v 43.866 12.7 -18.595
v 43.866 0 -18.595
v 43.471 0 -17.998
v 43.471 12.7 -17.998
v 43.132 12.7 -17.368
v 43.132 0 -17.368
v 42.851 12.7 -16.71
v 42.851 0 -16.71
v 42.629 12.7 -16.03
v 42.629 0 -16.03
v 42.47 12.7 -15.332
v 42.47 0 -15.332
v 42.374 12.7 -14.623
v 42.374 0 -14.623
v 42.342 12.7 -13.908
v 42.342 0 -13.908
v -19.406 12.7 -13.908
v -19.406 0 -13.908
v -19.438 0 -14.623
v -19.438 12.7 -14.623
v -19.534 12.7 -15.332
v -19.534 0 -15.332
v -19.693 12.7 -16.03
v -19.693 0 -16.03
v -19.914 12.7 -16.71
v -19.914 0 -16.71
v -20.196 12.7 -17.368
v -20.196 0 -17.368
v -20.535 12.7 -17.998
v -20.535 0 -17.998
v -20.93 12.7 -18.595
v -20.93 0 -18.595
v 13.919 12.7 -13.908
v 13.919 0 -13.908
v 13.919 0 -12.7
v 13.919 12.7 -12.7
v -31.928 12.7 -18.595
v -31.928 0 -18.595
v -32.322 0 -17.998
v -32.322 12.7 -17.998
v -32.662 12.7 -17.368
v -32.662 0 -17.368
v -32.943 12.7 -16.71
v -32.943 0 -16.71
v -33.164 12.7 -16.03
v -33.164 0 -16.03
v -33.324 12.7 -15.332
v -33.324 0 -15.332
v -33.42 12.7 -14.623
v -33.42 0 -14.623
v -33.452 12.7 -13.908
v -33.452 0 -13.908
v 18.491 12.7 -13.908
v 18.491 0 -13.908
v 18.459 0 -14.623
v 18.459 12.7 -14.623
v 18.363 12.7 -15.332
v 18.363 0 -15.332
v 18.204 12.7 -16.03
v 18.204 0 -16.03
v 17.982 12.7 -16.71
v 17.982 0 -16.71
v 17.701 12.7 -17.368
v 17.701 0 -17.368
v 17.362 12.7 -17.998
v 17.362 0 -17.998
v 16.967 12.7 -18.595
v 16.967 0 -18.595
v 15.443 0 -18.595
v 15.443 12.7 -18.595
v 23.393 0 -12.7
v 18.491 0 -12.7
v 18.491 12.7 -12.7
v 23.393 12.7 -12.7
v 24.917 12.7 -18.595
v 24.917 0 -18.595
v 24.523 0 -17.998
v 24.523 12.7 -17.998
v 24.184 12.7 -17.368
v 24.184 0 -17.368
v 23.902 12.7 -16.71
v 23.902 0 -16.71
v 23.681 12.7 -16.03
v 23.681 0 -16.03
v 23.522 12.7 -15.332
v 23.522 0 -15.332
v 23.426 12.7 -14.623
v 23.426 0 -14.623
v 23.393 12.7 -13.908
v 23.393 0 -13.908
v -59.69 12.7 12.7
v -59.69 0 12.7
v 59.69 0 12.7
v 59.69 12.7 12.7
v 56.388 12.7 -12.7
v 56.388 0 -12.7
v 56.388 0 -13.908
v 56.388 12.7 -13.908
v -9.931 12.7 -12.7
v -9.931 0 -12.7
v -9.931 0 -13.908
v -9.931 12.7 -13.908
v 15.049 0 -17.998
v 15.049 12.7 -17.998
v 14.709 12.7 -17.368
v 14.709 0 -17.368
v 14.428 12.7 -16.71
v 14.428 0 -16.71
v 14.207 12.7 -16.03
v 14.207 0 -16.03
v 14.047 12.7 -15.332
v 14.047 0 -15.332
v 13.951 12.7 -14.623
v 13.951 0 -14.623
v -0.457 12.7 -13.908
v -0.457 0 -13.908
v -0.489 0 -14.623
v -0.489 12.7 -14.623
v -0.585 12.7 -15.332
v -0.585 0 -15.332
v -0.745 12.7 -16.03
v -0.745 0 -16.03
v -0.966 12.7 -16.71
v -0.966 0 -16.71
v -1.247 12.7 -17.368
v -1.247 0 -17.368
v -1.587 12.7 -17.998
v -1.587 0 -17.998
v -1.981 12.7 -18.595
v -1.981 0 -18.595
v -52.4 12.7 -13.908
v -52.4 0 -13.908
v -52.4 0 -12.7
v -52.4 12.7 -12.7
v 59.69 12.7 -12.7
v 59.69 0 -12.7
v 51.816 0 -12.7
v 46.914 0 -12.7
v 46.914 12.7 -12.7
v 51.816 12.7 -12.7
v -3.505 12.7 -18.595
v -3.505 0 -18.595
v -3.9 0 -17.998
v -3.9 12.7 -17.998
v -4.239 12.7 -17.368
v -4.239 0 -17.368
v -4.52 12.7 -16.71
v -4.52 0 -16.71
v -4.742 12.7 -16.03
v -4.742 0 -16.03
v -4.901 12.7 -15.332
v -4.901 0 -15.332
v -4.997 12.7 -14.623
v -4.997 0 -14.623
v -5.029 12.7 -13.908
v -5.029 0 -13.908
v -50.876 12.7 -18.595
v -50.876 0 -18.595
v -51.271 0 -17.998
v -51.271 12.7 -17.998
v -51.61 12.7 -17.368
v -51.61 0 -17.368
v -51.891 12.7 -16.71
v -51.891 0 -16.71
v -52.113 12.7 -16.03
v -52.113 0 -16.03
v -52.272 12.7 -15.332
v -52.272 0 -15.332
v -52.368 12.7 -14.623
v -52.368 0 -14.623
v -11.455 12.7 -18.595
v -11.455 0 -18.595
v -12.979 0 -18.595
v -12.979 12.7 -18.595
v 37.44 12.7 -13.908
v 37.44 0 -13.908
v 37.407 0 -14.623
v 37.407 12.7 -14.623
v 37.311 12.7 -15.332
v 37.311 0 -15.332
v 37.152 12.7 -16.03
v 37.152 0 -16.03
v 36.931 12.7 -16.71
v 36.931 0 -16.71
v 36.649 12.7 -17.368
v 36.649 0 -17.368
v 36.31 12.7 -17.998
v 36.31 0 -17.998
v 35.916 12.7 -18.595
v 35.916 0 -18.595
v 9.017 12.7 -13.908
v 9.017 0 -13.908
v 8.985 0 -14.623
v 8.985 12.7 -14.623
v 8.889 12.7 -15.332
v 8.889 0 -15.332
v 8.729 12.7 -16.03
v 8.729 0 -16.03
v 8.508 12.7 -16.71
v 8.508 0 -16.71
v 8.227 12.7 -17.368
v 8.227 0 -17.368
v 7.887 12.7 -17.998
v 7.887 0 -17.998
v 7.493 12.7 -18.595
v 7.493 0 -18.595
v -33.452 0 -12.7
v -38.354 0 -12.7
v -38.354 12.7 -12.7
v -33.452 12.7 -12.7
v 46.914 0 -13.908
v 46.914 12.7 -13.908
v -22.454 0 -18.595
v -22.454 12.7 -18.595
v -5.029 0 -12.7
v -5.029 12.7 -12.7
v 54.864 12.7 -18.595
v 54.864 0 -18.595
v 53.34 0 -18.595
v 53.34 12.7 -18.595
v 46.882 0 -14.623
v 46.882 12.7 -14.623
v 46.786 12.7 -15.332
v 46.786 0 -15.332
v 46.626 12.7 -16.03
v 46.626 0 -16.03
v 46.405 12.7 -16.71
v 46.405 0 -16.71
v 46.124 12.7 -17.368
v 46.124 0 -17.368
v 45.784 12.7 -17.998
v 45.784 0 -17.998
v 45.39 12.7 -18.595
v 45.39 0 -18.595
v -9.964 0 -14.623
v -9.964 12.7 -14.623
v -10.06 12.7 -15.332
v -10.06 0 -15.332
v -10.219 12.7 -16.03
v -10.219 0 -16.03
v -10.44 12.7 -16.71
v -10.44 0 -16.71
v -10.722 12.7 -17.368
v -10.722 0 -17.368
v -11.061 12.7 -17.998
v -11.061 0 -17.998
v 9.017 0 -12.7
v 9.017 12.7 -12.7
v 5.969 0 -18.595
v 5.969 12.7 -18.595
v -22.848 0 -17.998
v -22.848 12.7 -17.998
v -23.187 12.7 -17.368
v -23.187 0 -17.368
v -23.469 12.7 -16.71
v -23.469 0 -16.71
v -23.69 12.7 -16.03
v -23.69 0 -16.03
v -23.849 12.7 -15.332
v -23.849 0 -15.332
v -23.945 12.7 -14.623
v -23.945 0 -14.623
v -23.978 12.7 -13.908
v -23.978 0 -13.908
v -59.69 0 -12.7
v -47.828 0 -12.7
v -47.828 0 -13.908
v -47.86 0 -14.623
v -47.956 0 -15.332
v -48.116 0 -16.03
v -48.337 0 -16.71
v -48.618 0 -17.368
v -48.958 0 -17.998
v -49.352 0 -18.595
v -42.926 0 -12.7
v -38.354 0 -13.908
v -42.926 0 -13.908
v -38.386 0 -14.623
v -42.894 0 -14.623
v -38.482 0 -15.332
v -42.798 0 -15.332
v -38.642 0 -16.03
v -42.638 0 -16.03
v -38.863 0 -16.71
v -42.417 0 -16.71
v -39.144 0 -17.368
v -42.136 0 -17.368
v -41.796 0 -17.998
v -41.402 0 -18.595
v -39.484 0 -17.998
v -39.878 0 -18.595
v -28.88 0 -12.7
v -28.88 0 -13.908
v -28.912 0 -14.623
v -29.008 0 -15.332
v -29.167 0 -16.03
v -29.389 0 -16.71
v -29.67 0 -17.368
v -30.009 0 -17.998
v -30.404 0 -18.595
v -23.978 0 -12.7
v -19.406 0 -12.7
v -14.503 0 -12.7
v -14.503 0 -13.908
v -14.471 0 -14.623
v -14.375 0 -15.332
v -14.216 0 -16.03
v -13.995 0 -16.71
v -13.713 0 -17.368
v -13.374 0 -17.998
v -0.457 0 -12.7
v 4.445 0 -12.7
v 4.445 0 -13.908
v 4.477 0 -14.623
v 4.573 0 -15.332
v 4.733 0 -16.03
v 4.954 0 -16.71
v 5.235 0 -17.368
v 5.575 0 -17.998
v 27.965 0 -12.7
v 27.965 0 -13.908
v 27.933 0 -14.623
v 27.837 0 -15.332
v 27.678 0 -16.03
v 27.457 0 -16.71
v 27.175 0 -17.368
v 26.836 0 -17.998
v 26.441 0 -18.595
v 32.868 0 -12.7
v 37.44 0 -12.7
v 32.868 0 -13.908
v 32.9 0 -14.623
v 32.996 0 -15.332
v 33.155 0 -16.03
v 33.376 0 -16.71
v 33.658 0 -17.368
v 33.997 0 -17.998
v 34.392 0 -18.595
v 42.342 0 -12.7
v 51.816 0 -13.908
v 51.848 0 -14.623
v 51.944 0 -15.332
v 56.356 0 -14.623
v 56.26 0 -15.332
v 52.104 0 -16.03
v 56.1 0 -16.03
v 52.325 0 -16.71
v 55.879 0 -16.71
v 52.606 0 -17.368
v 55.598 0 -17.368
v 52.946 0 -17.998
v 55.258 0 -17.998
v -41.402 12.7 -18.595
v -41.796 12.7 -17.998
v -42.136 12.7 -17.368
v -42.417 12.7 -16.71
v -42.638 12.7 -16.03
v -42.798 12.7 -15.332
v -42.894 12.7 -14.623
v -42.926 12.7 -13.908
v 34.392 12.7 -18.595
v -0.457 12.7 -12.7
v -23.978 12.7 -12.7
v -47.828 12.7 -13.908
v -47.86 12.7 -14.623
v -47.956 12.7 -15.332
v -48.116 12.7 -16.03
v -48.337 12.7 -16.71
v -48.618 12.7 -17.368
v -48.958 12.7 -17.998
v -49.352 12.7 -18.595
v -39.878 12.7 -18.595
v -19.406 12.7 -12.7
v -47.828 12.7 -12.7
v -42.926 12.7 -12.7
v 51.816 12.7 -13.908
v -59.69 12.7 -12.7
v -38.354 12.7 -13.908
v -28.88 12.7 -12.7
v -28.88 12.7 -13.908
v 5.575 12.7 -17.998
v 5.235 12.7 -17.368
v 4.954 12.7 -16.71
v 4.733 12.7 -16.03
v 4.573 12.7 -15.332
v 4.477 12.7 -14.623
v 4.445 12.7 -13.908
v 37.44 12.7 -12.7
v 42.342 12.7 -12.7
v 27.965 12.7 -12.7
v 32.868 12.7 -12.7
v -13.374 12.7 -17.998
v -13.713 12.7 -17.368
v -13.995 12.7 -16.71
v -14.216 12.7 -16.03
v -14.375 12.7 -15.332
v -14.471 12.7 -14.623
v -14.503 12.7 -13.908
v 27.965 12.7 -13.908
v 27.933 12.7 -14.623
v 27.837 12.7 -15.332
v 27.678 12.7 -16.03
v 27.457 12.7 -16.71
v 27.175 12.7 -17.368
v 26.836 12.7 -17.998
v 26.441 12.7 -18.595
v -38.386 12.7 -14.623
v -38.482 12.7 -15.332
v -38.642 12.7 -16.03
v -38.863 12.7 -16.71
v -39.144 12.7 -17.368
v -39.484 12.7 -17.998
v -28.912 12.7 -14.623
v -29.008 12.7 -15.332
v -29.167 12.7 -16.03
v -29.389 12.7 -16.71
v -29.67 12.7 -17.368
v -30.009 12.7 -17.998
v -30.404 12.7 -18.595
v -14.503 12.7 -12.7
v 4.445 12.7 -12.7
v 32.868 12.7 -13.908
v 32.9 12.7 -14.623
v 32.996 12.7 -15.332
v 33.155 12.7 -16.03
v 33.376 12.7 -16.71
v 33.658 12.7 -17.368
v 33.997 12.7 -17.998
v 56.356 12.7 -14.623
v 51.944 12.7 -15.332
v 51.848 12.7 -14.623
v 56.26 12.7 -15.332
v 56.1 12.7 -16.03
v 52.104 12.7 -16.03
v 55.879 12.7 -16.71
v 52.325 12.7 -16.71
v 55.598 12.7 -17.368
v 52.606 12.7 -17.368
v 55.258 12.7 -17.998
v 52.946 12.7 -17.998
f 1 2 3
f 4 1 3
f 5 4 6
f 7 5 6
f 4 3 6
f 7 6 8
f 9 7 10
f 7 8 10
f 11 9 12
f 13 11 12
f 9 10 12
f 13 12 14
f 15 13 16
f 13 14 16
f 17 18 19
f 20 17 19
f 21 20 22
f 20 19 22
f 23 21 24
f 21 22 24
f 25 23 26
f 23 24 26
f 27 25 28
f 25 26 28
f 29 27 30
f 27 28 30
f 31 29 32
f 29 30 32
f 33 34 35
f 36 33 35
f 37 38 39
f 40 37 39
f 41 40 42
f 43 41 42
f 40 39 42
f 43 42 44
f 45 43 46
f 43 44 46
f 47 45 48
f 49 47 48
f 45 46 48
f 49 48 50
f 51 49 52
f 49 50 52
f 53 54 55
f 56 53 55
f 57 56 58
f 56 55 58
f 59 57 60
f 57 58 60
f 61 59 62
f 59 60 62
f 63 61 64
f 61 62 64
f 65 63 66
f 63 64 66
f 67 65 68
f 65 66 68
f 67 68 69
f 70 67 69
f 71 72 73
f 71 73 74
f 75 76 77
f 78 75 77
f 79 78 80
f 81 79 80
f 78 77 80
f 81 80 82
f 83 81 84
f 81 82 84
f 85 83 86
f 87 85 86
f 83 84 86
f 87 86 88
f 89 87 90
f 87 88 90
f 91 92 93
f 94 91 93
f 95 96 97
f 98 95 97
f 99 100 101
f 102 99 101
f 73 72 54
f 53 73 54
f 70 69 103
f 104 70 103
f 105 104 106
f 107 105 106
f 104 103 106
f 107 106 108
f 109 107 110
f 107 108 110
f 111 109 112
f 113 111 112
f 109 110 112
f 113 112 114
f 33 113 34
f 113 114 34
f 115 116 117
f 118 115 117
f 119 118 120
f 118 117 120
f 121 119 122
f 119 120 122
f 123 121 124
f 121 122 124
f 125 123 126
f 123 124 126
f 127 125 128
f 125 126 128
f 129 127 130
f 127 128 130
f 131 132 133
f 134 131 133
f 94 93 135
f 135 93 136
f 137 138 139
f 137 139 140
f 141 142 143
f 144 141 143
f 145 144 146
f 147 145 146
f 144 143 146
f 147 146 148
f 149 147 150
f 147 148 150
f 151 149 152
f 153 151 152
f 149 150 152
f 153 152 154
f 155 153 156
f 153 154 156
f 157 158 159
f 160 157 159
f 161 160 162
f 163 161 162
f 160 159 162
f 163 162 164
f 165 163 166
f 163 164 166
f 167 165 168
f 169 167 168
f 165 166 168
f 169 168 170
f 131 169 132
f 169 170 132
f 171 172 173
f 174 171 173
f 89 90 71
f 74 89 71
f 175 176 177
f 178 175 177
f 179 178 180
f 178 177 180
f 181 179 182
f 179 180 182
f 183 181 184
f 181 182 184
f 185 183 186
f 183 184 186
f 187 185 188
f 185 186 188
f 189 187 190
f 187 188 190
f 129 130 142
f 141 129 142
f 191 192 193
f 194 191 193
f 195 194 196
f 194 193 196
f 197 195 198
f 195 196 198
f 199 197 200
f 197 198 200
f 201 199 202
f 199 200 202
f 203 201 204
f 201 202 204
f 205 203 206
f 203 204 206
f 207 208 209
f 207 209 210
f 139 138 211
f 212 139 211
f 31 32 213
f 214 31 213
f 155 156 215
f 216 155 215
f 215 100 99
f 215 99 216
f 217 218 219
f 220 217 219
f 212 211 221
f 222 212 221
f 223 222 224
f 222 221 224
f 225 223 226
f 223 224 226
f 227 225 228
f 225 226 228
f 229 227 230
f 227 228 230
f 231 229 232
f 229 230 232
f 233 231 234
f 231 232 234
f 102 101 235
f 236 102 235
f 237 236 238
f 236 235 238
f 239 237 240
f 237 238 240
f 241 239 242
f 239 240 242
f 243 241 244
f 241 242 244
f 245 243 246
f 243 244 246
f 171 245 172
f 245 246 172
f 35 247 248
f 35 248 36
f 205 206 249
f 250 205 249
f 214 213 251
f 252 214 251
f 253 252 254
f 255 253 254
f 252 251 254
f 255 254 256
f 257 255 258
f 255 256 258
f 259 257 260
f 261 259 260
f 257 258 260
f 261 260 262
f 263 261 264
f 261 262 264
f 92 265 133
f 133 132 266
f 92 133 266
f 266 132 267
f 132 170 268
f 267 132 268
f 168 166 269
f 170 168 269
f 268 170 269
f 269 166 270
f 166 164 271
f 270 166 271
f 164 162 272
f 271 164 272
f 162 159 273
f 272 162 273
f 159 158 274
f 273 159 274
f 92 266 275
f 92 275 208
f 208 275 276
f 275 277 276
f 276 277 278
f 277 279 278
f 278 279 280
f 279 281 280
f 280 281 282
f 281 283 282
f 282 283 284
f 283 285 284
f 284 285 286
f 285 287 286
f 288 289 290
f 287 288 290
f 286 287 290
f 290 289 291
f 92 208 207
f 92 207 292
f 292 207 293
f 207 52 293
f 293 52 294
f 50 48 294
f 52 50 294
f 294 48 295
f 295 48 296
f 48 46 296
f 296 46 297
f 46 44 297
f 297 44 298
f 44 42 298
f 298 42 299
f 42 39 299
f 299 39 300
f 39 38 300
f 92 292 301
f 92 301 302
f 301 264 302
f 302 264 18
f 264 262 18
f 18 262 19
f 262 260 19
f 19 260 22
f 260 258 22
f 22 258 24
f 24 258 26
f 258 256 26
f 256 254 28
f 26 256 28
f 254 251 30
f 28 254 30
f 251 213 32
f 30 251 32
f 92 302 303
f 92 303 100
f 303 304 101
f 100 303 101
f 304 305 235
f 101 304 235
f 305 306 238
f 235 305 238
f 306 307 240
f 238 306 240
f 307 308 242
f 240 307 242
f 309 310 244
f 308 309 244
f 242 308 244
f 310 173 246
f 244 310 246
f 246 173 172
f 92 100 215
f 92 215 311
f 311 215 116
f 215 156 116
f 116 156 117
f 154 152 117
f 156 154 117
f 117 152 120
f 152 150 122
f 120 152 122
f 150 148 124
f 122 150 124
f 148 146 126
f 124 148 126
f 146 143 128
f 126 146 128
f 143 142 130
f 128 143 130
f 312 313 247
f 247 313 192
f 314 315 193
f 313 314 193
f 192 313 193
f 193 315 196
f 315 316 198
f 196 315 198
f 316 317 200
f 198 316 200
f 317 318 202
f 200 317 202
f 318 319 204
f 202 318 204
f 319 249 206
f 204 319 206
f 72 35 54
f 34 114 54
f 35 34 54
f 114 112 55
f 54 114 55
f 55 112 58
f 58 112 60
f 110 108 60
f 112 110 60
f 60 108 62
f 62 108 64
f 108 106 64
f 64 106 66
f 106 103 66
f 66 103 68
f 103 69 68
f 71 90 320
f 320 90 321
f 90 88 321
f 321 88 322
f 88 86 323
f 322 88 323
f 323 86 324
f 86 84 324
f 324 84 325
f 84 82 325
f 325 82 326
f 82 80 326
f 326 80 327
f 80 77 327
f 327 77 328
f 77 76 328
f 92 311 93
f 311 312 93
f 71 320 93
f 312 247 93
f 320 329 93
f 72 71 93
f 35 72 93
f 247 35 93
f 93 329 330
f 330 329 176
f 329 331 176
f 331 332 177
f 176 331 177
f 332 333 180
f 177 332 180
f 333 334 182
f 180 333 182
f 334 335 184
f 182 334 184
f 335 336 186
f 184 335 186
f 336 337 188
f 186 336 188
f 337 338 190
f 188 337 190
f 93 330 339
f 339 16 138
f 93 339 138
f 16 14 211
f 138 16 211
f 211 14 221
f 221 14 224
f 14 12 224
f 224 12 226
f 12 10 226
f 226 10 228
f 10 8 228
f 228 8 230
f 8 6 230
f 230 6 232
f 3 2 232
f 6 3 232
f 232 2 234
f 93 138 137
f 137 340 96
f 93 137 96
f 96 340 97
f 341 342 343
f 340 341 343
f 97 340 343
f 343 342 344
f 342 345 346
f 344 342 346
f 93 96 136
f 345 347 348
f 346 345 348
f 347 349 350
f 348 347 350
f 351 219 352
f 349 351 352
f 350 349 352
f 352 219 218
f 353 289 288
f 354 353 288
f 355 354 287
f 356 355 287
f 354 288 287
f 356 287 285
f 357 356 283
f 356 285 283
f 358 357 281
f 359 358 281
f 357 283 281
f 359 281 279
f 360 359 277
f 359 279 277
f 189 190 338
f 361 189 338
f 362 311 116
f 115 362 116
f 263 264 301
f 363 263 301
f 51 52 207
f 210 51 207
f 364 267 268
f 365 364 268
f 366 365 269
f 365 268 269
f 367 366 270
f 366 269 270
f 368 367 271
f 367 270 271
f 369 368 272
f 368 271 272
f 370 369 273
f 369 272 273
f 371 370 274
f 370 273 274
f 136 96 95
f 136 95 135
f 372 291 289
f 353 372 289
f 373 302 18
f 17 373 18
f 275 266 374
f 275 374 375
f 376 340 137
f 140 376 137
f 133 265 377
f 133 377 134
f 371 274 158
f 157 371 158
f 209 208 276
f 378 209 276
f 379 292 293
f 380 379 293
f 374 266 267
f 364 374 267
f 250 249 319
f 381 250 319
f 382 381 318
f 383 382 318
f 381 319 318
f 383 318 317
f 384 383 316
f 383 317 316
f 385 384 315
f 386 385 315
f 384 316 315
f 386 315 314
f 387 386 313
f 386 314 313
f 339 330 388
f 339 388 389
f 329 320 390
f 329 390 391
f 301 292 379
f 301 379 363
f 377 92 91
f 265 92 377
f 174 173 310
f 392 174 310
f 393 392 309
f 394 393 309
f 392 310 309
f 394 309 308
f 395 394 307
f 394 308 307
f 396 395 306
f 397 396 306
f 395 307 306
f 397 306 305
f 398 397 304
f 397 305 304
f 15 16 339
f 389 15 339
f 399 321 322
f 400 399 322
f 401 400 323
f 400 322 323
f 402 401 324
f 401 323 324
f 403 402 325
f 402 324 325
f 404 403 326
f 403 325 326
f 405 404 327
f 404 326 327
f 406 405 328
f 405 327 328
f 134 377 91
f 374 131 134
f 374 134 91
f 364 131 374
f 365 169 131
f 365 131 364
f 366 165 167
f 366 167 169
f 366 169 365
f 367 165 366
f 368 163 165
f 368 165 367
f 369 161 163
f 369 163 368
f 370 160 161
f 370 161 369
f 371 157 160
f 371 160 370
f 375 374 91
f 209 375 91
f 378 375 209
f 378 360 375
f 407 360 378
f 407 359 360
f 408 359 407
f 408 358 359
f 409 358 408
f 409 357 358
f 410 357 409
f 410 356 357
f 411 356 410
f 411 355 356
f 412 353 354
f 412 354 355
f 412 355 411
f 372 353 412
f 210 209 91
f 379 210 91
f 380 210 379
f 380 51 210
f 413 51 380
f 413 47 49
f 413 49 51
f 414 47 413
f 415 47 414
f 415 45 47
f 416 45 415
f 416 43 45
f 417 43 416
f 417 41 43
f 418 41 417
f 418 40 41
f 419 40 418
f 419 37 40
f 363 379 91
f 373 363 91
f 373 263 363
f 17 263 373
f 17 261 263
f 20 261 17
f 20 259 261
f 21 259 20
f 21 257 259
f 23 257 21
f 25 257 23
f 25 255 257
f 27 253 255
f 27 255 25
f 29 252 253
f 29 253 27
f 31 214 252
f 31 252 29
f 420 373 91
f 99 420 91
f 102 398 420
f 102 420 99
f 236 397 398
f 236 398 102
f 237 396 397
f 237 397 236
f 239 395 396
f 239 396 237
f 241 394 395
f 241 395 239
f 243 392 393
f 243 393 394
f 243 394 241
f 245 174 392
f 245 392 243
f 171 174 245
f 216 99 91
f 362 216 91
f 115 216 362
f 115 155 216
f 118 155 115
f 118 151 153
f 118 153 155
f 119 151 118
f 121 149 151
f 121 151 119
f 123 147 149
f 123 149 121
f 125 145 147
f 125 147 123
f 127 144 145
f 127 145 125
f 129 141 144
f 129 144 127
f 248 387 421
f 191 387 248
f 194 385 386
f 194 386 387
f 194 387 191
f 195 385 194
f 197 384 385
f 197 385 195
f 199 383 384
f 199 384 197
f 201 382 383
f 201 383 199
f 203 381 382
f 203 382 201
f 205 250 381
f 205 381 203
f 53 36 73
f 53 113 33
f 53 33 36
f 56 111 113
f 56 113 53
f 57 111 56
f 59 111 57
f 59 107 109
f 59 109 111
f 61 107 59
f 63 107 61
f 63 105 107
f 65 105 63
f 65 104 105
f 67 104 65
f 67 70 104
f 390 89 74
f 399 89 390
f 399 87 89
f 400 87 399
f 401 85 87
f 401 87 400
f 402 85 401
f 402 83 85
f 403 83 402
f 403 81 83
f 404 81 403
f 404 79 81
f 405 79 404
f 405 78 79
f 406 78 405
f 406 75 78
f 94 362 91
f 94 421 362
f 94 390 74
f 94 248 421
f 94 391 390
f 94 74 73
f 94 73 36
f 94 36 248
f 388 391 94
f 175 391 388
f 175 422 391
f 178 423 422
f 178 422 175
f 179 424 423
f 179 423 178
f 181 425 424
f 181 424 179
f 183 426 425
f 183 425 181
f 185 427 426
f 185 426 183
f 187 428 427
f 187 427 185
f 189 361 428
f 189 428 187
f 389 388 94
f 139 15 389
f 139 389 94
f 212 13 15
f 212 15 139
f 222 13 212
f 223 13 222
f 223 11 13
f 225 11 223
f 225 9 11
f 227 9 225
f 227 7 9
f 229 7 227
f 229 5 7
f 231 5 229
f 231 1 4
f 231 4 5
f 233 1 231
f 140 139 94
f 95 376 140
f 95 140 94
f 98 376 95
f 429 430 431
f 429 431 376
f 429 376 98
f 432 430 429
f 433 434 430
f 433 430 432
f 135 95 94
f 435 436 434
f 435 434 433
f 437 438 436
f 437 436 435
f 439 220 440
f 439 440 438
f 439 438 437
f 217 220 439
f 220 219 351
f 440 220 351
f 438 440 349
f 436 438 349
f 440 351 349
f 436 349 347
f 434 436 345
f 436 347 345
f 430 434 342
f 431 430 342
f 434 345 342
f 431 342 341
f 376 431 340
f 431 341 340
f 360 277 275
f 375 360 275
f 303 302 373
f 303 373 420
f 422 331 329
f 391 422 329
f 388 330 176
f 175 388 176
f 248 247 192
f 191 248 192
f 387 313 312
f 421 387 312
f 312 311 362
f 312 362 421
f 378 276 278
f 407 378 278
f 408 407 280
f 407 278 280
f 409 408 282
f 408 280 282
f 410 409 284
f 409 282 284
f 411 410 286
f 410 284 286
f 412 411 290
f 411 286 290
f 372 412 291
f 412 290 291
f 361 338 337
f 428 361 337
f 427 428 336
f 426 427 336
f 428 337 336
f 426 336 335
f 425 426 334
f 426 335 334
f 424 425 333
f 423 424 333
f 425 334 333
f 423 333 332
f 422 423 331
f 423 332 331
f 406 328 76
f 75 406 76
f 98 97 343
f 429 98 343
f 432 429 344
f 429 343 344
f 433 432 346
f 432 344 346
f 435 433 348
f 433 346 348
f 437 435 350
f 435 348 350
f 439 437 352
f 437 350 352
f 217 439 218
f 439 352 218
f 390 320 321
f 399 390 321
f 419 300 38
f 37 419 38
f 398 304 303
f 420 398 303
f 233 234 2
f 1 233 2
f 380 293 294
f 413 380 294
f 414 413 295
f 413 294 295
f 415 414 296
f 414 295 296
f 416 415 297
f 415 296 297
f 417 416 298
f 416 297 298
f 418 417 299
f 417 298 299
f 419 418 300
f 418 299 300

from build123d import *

# Parameters (mm, degrees)
BOSS_EXTRUDE1_DEPTH = 12.7
BOSS_EXTRUDE2_DEPTH = 12.7
LPATTERN1_COUNT     = 12
LPATTERN1_PITCH     = 9.4742


with BuildPart() as part:
    # Sketch1 → Boss-Extrude1 (new body)
    with BuildSketch(Plane(origin=(0, 0, 0), x_dir=(1, 0, 0), z_dir=(0, 1, 0))):
        Polygon((-59.69, 12.7), (-59.69, -12.7), (59.69, -12.7), (59.69, 12.7), (56.388, 12.7), (51.816, 12.7), align=None)
    extrude(amount=BOSS_EXTRUDE1_DEPTH)

    # Sketch1<4> → Boss-Extrude2 (add)
    with BuildSketch(Plane(origin=(0, 0, 0), x_dir=(1, 0, 0), z_dir=(0, 1, 0))):
        with BuildLine():
            Line((51.816, 13.908285481), (51.816, 12.7))
            Line((51.816, 12.7), (56.388, 12.7))
            Line((56.388, 12.7), (56.388, 13.908285481))
            ThreePointArc((56.388, 13.908285481), (55.997429107, 16.372543207), (54.864, 18.595255564))
            Line((54.864, 18.595255564), (53.34, 18.595255564))
            ThreePointArc((53.34, 18.595255564), (52.206570893, 16.372543207), (51.816, 13.908285481))
        make_face()
    boss_extrude2 = extrude(amount=BOSS_EXTRUDE2_DEPTH)

    # LPattern1: Boss-Extrude2 ×12
    with Locations(*[(-i * LPATTERN1_PITCH, 0, 0) for i in range(1, LPATTERN1_COUNT)]):
        add(boss_extrude2)


solid = part.part
